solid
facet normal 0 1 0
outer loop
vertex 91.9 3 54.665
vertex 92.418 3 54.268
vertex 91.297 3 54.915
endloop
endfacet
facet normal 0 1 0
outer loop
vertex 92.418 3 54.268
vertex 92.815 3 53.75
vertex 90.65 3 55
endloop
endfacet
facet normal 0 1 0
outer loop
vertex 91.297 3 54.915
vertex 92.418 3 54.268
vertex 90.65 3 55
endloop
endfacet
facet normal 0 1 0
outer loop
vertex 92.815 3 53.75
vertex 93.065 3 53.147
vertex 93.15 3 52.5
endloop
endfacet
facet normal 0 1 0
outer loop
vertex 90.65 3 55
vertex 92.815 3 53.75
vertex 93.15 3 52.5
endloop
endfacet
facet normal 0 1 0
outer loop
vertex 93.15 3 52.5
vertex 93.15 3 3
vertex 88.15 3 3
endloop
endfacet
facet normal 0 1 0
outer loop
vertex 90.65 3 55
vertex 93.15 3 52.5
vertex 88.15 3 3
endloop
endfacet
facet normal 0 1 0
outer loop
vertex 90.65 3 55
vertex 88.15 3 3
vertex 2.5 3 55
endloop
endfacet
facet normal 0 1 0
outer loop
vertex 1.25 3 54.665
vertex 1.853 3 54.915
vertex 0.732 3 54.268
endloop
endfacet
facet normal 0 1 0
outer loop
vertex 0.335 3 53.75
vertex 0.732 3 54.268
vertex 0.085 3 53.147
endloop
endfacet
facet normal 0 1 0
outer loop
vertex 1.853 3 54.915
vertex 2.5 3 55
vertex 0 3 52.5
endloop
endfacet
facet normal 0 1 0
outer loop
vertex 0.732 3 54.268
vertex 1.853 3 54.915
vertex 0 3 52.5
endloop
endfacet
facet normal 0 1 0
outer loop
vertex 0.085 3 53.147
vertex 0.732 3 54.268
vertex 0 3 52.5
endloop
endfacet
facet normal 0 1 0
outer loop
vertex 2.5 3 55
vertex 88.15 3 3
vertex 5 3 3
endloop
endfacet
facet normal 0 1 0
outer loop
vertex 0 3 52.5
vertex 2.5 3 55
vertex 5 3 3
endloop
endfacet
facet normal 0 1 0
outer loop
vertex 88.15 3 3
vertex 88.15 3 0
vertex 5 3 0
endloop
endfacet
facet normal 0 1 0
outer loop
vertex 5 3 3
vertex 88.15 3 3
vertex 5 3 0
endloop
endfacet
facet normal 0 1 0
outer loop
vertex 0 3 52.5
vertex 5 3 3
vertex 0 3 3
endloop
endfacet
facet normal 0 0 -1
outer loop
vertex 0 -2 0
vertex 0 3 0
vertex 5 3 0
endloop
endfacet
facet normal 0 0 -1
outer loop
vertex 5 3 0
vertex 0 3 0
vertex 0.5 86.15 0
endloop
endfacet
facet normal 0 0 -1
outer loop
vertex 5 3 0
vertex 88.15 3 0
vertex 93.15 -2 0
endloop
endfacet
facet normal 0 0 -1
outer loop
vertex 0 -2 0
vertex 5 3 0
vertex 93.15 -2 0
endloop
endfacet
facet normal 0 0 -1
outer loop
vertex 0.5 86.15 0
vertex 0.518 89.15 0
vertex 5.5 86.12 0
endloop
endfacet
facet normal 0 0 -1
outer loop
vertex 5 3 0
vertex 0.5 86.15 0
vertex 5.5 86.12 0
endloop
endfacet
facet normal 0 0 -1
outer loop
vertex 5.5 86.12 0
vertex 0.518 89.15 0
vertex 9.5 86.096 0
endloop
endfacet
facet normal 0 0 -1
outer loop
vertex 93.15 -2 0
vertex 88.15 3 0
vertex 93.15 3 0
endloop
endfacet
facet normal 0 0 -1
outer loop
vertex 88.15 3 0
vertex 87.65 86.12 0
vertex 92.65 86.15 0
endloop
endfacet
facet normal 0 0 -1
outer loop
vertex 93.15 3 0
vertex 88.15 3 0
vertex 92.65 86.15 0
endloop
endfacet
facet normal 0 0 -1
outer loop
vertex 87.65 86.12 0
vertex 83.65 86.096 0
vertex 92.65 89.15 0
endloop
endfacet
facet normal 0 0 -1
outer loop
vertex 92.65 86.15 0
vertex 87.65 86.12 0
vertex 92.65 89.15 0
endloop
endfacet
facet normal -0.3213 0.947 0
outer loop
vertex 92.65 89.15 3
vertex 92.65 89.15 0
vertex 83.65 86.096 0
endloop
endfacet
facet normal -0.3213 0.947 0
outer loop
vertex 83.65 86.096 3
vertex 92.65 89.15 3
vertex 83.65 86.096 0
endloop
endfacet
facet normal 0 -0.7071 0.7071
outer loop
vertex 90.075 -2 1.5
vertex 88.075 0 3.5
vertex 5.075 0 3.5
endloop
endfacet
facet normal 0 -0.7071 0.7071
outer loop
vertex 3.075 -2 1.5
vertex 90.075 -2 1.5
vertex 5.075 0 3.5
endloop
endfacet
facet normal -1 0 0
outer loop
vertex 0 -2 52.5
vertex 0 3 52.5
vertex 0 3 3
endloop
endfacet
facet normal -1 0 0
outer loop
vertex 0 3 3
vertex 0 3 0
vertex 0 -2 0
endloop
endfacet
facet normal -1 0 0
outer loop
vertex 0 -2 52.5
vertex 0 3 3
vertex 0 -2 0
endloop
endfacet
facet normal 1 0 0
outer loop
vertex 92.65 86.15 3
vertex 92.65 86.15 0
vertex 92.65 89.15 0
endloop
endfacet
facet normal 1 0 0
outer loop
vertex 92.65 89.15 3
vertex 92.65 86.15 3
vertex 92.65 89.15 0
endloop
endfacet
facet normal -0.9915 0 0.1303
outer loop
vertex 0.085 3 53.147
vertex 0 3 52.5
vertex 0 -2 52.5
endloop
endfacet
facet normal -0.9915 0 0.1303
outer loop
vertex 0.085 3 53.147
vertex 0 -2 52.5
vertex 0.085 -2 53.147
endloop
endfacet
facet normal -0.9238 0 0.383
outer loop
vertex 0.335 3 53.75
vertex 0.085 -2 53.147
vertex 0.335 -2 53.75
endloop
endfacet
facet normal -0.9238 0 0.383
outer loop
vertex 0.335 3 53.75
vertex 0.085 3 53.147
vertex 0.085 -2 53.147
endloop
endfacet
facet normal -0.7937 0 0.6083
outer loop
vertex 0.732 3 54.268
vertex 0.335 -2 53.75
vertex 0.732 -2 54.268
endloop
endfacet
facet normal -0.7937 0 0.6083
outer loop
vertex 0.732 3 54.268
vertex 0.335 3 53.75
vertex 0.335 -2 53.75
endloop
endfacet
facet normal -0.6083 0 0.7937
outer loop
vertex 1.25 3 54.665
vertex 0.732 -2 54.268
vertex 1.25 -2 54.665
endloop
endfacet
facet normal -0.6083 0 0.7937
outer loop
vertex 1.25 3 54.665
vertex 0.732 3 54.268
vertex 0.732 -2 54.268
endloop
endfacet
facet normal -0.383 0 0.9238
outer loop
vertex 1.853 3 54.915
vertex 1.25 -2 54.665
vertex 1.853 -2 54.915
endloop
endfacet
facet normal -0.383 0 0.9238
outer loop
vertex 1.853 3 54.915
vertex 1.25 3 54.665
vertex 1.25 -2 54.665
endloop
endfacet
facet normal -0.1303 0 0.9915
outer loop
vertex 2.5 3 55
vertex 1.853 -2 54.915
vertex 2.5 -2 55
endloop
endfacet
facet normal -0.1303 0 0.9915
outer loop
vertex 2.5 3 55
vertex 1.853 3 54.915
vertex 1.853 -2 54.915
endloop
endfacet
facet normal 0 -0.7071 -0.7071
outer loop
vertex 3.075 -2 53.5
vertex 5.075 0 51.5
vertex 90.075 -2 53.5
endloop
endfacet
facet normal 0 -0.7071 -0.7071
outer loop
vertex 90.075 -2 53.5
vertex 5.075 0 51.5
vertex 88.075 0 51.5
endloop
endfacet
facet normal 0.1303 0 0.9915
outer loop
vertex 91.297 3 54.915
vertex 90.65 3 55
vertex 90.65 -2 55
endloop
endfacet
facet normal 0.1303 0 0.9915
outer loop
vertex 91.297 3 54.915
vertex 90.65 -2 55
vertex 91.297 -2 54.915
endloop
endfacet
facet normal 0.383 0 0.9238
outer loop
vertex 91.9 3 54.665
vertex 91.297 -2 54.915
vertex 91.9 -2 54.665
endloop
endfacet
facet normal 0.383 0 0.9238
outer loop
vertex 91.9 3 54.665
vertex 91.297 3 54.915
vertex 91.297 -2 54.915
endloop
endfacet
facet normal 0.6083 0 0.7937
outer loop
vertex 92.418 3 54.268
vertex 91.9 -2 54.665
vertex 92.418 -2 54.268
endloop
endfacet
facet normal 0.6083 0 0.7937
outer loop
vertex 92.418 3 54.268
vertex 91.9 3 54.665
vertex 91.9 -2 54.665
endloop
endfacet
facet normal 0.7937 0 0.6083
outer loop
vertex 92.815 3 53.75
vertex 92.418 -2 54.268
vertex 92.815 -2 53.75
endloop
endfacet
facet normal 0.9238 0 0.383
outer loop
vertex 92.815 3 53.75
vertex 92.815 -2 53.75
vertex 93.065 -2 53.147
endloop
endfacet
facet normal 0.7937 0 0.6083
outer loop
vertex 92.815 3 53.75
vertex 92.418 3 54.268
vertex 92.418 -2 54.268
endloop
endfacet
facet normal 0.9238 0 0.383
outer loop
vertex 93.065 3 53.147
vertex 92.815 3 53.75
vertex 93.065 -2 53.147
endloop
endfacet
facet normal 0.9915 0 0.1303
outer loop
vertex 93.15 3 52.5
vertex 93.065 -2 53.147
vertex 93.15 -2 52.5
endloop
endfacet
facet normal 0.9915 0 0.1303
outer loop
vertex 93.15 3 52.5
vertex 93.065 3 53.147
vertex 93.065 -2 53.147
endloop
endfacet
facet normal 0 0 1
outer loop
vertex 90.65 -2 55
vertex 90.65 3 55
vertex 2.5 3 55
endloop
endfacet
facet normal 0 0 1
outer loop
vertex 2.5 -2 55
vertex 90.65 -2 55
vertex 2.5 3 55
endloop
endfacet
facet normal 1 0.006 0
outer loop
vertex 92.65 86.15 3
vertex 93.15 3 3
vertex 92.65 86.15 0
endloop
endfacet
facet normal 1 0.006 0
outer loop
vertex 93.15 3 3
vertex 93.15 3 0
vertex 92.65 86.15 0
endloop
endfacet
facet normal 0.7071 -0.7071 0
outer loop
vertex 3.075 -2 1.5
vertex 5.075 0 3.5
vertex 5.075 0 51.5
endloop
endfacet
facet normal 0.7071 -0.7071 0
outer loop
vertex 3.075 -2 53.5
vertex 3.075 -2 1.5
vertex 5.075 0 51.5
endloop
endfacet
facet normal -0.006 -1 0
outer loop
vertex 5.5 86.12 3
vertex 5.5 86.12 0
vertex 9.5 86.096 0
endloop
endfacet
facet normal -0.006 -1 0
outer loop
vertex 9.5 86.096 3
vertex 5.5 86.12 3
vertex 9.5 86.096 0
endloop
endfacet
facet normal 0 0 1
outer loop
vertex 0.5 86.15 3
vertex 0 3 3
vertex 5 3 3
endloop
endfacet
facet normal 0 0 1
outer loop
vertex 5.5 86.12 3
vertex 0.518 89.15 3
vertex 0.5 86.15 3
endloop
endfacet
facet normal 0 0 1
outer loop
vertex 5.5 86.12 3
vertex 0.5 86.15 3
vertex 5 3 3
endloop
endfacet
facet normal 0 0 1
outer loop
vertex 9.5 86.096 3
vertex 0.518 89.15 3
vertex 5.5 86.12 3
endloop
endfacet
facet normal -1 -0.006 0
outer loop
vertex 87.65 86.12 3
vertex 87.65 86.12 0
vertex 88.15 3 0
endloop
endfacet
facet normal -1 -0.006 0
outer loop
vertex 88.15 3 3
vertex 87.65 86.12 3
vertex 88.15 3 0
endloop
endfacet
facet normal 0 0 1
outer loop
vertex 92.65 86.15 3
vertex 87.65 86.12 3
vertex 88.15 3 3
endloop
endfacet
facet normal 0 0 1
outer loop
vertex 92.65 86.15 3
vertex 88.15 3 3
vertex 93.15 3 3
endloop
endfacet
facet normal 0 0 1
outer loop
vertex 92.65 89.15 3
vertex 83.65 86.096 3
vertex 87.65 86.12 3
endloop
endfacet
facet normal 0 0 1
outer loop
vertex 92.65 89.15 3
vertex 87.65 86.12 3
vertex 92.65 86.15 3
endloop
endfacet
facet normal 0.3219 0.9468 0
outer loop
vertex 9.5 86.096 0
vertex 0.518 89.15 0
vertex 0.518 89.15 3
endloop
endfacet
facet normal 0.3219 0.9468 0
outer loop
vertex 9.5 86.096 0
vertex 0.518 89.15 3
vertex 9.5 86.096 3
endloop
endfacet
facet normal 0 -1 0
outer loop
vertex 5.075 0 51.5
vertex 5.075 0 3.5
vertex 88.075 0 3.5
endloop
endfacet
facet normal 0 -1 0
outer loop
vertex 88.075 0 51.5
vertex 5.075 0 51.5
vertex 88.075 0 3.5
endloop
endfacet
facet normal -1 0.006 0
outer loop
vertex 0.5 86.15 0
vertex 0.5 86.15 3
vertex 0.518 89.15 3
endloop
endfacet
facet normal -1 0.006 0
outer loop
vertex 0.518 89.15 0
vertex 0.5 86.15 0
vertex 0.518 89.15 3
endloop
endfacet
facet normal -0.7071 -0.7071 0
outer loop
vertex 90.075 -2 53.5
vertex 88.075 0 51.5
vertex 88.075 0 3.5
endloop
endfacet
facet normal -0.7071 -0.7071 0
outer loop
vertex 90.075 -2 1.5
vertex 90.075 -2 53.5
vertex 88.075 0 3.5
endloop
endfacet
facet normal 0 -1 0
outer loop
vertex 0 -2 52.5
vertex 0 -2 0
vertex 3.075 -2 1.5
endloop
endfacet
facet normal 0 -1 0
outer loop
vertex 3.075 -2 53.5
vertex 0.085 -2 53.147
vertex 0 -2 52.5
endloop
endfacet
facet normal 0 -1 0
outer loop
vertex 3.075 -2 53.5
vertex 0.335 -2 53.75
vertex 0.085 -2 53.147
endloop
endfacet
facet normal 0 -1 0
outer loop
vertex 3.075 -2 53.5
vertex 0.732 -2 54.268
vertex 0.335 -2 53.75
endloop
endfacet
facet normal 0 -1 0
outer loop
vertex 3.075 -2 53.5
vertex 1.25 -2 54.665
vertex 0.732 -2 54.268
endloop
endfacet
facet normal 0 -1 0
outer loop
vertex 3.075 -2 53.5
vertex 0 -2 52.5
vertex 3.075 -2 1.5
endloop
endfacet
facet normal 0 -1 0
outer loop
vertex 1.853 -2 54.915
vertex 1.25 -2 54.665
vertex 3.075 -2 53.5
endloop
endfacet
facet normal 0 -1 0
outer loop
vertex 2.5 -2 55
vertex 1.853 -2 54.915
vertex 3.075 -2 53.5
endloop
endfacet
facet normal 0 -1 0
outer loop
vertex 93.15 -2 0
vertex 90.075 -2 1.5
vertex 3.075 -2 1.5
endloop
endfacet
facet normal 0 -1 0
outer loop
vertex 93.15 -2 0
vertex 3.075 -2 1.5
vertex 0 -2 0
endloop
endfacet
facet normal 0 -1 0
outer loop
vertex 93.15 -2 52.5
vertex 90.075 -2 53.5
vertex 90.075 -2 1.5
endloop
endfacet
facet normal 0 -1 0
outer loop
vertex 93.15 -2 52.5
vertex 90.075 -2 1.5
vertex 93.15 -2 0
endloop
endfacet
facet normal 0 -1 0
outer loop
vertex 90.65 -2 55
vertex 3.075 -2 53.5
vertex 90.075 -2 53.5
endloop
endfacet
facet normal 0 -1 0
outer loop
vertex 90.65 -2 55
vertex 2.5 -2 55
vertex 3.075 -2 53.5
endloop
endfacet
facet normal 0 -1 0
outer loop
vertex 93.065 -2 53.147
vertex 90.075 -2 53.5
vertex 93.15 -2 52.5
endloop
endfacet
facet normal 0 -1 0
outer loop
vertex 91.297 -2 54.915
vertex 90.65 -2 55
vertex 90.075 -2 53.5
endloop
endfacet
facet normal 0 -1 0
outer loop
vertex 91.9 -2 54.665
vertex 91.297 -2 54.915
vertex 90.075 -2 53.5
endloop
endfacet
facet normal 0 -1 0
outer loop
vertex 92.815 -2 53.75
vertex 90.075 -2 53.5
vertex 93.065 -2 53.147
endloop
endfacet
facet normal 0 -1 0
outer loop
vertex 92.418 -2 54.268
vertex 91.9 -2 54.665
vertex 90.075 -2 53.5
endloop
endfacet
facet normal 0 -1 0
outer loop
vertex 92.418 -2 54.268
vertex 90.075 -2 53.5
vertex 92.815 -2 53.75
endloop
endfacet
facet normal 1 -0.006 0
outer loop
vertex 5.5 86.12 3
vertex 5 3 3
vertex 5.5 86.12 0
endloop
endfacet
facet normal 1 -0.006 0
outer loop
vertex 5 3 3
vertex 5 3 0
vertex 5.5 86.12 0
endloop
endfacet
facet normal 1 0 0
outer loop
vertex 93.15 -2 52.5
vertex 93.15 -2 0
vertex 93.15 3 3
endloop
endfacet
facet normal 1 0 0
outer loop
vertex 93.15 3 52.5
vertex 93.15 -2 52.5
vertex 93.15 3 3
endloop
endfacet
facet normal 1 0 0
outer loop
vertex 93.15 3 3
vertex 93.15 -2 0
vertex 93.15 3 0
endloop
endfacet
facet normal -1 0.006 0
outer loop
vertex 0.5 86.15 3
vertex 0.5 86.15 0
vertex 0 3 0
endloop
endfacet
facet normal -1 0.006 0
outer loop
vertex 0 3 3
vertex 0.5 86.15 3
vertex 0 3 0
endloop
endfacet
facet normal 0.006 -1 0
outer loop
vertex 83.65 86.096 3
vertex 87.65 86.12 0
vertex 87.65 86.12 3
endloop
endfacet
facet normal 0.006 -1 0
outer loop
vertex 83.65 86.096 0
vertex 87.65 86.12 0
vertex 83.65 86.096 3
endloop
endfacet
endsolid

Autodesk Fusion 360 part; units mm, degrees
sketch "Sketch1" plane through (0, 0, 0) normal (0, 0, 1) x (1, 0, 0) in component "LightSwitchShelf"
  line L0 (0, 0) -> (93.15, 0)
  line L1 (93.15, 0) -> (93.15, 3)
  line L2 (93.15, 3) -> (0, 3)
  line L3 (0, 3) -> (0, 0)
  line L4 (0, 3) -> (5, 3)
  line L5 (93.15, 3) -> (88.15, 3)
  line L6 (46.575, 3) -> (46.575, 86.15) construction
  line L7 (0.5, 86.15) -> (46.575, 86.15) construction
  line L8 (46.575, 86.15) -> (92.65, 86.15) construction
  line L9 (0.5, 86.15) -> (5.5, 86.15)
  line L10 (92.65, 86.15) -> (87.65, 86.15)
  line L11 (0.5, 86.15) -> (0, 3)
  line L12 (5, 3) -> (5.5, 86.15)
  line L13 (87.65, 86.15) -> (88.15, 3)
  line L14 (93.15, 3) -> (92.65, 86.15)
  line L15 (0.5, 86.15) -> (9.4998, 86.0959)
  line L16 (0.5, 86.15) -> (0.518, 89.1499)
  line L17 (0.518, 89.1499) -> (9.4998, 86.0959)
  line L18 (92.65, 86.15) -> (83.6502, 86.0959)
  line L19 (92.65, 86.15) -> (92.65, 89.15)
  line L20 (92.65, 89.15) -> (83.6502, 86.0959)
  dimension "d2" = 3
  dimension "d8" = 5
  dimension "d10" = 83.15
  dimension "d11" = 46.075
  dimension "d14" = 9
  dimension "d15" = 3
  dimension "d17" = 3
  dimension "d18" = 90
  dimension "d19" = 90
  dimension "d29" = 83.15
  dimension "d30" = 82.15
extrude "Extrude1" add sketch "Sketch1" along normal blind 3 makes body 1 in component "LightSwitchShelf"
extrude "Extrude2" add sketch "Sketch1" along normal blind 55 separate body contours L0 L1 L2 L3 L4 L5 makes body 2 in component "LightSwitchShelf"
sketch "Sketch2" plane through (0, 0, 0) normal (0, -1, 0) x (1, 0, 0) in component "LightSwitchShelf"
  line L0 (0, 0) -> (93.15, 0)
  line L1 (93.15, 0) -> (93.15, 55)
  line L2 (93.15, 55) -> (0, 55)
  line L3 (0, 55) -> (0, 0)
  line L4 (46.575, 55) -> (46.575, 0) construction
  line L5 (0, 27.5) -> (93.15, 27.5) construction
  line L6 (88.075, 3.5) -> (5.075, 3.5)
  line L7 (5.075, 3.5) -> (5.075, 51.5)
  line L8 (5.075, 51.5) -> (88.075, 51.5)
  line L9 (88.075, 51.5) -> (88.075, 3.5)
  line L10 (88.075, 3.5) -> (5.075, 51.5) construction
  line L11 (5.075, 3.5) -> (88.075, 51.5) construction
  point P0 (46.575, 27.5)
  dimension "d24" = 48
  dimension "d25" = 83
extrude "Extrude3" add sketch "Sketch2" along normal blind 2 bodies 1 2 in component "LightSwitchShelf"
chamfer "Chamfer1" distance 2 angle 45 4 edges at (5.075, -2, 27.5) (46.575, -2, 51.5) (88.075, -2, 27.5) (46.575, -2, 3.5) on bodies 1 in component "LightSwitchShelf"
fillet "Fillet1" radius 2.5 2 edges at (0, 0.5, 55) (93.15, 0.5, 55) on bodies 1 in component "LightSwitchShelf"
component "LightSwitchShelf" placed x (1, 0, 0) y (0, 1, 0) z (0, 0, 1) at (0, 0, 0)
equation "d11 = ( 83.15 / 2 ) * 1 mm + 4.5 mm"
